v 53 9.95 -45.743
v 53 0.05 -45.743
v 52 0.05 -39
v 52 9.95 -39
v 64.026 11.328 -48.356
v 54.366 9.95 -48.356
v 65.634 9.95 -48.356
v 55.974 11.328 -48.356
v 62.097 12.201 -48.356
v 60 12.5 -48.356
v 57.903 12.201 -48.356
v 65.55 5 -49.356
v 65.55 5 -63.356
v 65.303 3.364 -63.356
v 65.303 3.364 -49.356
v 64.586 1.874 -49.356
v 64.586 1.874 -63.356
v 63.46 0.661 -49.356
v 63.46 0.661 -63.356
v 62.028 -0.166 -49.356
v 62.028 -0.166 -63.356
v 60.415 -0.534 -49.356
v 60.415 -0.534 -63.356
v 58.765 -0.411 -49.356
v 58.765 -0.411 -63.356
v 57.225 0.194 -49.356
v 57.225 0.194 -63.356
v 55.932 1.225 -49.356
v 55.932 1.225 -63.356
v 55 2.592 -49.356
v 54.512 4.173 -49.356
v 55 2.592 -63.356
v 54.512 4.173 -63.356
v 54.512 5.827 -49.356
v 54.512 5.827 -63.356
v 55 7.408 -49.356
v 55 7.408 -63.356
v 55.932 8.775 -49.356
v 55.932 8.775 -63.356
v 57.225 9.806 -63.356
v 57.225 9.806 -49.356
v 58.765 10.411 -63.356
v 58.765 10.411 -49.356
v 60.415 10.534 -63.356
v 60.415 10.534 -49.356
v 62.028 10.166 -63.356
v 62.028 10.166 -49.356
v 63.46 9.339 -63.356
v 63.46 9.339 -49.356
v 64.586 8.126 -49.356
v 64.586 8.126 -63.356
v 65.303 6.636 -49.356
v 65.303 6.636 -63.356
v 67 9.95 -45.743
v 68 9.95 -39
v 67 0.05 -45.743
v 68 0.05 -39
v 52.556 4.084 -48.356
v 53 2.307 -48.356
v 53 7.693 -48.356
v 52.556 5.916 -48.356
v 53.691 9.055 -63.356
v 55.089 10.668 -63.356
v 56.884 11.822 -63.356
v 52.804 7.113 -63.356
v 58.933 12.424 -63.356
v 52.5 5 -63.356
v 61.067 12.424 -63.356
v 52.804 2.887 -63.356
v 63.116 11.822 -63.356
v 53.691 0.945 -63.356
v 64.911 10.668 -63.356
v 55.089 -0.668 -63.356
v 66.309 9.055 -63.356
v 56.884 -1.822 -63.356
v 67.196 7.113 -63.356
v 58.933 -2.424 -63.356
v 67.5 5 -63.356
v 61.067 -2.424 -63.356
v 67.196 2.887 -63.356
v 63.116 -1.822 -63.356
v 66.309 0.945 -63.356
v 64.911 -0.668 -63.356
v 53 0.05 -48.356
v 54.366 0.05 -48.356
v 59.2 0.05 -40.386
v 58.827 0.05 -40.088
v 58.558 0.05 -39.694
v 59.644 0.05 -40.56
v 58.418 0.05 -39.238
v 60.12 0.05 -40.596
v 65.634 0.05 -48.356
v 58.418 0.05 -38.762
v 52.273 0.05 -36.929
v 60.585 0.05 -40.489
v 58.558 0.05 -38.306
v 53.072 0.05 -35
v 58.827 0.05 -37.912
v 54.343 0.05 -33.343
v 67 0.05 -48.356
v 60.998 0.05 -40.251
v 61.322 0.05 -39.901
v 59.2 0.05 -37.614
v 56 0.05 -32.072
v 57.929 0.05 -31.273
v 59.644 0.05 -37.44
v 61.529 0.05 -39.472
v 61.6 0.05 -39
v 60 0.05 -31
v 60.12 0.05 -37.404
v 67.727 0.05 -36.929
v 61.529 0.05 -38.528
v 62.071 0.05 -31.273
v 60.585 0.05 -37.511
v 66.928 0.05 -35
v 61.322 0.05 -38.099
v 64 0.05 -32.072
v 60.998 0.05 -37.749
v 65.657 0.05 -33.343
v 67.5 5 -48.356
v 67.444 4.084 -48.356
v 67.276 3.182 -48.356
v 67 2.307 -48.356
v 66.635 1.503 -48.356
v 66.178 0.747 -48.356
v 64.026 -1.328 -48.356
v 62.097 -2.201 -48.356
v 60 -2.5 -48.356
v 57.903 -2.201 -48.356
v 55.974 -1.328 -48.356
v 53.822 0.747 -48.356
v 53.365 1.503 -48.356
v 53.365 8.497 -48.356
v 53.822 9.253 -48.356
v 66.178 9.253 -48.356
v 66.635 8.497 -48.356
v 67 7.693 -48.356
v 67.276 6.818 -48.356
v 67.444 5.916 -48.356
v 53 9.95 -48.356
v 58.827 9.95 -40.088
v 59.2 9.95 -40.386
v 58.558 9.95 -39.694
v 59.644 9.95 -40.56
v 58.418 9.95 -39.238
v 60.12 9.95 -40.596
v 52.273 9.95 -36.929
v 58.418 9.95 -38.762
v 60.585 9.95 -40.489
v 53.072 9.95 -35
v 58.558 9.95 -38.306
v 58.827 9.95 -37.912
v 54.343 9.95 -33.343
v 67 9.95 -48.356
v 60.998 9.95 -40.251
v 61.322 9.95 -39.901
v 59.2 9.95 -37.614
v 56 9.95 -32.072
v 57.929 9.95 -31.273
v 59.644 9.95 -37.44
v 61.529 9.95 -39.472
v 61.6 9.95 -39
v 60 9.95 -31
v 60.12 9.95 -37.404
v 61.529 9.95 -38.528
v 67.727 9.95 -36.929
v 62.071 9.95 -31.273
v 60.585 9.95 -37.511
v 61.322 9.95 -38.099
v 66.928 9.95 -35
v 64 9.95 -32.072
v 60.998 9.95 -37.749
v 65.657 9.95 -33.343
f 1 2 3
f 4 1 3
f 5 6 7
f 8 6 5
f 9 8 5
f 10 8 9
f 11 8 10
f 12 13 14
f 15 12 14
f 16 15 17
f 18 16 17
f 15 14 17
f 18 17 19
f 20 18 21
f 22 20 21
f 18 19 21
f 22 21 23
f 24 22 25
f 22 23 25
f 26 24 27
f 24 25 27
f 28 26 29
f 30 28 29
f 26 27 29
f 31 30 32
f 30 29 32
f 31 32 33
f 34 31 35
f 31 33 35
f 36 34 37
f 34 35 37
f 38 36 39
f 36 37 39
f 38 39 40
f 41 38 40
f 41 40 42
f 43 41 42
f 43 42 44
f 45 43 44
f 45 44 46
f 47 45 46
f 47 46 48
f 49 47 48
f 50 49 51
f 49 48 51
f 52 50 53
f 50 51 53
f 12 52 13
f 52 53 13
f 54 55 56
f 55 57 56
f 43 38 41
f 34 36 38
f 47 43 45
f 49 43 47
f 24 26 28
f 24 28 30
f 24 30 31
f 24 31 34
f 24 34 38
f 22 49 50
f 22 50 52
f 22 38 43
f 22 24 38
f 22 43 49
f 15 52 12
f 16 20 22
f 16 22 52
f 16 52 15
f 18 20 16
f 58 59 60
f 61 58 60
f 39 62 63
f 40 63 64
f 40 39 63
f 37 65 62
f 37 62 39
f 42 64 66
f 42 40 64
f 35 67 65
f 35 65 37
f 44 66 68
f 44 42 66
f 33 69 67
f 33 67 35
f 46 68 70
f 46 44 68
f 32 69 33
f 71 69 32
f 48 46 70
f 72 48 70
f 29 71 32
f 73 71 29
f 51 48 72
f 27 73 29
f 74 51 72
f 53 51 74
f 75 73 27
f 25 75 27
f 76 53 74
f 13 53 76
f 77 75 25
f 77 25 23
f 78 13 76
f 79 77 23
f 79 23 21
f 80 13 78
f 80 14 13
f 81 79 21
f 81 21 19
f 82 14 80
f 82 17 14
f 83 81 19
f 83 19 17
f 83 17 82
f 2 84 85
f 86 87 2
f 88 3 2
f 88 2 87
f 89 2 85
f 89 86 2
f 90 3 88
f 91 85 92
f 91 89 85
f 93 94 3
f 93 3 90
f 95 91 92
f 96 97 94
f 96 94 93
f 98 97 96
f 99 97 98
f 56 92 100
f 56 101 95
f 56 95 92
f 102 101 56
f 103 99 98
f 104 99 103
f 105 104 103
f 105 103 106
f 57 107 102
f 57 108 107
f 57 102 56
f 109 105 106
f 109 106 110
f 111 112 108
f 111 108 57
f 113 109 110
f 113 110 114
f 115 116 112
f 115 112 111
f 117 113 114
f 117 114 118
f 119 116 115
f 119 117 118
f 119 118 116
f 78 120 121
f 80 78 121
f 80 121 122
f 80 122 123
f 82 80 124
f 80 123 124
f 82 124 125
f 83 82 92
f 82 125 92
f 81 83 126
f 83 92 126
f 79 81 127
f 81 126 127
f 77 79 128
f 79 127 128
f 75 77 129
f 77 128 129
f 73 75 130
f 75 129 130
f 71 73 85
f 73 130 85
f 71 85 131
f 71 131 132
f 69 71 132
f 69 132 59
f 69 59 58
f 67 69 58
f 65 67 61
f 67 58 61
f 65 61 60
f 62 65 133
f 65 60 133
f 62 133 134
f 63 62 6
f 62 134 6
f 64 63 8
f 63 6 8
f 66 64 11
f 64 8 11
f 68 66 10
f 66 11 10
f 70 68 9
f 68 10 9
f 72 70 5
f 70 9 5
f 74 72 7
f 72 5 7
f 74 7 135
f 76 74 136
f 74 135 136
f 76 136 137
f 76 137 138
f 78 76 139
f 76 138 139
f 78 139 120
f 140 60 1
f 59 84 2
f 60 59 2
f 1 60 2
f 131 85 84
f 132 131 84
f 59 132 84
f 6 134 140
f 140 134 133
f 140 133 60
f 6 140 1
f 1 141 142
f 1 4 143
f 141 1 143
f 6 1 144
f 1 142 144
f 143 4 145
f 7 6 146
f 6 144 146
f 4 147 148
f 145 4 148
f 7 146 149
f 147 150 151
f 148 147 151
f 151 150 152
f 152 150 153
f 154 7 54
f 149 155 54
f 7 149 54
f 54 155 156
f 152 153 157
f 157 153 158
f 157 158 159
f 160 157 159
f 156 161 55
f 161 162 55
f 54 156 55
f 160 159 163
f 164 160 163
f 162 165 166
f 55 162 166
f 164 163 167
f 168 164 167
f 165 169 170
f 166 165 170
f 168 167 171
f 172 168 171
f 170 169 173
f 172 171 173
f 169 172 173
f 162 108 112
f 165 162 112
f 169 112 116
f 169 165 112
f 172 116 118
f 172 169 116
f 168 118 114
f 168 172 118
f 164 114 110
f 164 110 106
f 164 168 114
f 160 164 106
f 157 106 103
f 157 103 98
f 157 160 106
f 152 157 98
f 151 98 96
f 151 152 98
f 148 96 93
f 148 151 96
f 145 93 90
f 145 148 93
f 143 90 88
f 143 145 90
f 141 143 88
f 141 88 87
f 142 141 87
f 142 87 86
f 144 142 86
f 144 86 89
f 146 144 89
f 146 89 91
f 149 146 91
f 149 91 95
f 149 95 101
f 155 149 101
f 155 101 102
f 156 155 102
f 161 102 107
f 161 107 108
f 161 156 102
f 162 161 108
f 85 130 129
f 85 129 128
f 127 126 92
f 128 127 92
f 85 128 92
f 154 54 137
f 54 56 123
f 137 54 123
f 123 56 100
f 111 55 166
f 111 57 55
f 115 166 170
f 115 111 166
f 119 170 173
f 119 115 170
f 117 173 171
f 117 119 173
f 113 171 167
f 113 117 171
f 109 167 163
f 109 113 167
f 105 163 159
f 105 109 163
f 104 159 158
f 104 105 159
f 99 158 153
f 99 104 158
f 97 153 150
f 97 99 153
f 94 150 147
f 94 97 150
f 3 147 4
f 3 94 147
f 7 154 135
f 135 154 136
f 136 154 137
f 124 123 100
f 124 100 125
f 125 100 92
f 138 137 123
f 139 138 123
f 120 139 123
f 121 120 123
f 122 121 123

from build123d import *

# Parameters (mm, degrees)
SKETCH017_R             = 1.6
PAD008_DEPTH            = 4.95
SKETCH018_R             = 7.5
PAD009_DEPTH            = 15
SKETCH019_R             = 5.55
POCKET004_DEPTH         = 14
BODY004_PLACEMENT_ANGLE = 90


with BuildPart() as part:
    # Sketch017 (on DatumPlane) → Pad008 (new body, symmetric)
    with BuildSketch(Plane(origin=(110, 5, 25), x_dir=(0, 0, 1), z_dir=(0, -1, 0))):
        with BuildLine():
            ThreePointArc((8, -2.2e-05), (0, 8), (-8, -2.2e-05))
            Line((-7, -6.742665), (-8, -2.2e-05))
            Line((-7, -9.356116), (-7, -6.742665))
            Line((7, -9.356116), (-7, -9.356116))
            Line((7, -6.742665), (7, -9.356116))
            Line((8, -2.2e-05), (7, -6.742665))
        make_face()
        Circle(SKETCH017_R, mode=Mode.SUBTRACT)
    extrude(amount=PAD008_DEPTH, both=True)

    # Sketch018 (on DatumPlane) → Pad009 (join)
    with BuildSketch(Plane(origin=(119.356116, 5, 25), x_dir=(0, 0, 1), z_dir=(1, 0, 0))):
        Circle(SKETCH018_R)
    extrude(amount=PAD009_DEPTH)

    # Sketch019 (on DatumPlane) → Pocket004 (cut)
    with BuildSketch(Plane(origin=(134.356116, 5, 25), x_dir=(0, 0, 1), z_dir=(1, 0, 0))):
        Circle(SKETCH019_R)
    extrude(amount=-POCKET004_DEPTH, mode=Mode.SUBTRACT)


with BuildPart() as part_1:
    # Body004 placement: moved
    add(part.part.moved(Location((35, 0, 71))).rotate(Axis((35, 0, 71), (0, 1, 0)), BODY004_PLACEMENT_ANGLE))


solid = part_1.part
